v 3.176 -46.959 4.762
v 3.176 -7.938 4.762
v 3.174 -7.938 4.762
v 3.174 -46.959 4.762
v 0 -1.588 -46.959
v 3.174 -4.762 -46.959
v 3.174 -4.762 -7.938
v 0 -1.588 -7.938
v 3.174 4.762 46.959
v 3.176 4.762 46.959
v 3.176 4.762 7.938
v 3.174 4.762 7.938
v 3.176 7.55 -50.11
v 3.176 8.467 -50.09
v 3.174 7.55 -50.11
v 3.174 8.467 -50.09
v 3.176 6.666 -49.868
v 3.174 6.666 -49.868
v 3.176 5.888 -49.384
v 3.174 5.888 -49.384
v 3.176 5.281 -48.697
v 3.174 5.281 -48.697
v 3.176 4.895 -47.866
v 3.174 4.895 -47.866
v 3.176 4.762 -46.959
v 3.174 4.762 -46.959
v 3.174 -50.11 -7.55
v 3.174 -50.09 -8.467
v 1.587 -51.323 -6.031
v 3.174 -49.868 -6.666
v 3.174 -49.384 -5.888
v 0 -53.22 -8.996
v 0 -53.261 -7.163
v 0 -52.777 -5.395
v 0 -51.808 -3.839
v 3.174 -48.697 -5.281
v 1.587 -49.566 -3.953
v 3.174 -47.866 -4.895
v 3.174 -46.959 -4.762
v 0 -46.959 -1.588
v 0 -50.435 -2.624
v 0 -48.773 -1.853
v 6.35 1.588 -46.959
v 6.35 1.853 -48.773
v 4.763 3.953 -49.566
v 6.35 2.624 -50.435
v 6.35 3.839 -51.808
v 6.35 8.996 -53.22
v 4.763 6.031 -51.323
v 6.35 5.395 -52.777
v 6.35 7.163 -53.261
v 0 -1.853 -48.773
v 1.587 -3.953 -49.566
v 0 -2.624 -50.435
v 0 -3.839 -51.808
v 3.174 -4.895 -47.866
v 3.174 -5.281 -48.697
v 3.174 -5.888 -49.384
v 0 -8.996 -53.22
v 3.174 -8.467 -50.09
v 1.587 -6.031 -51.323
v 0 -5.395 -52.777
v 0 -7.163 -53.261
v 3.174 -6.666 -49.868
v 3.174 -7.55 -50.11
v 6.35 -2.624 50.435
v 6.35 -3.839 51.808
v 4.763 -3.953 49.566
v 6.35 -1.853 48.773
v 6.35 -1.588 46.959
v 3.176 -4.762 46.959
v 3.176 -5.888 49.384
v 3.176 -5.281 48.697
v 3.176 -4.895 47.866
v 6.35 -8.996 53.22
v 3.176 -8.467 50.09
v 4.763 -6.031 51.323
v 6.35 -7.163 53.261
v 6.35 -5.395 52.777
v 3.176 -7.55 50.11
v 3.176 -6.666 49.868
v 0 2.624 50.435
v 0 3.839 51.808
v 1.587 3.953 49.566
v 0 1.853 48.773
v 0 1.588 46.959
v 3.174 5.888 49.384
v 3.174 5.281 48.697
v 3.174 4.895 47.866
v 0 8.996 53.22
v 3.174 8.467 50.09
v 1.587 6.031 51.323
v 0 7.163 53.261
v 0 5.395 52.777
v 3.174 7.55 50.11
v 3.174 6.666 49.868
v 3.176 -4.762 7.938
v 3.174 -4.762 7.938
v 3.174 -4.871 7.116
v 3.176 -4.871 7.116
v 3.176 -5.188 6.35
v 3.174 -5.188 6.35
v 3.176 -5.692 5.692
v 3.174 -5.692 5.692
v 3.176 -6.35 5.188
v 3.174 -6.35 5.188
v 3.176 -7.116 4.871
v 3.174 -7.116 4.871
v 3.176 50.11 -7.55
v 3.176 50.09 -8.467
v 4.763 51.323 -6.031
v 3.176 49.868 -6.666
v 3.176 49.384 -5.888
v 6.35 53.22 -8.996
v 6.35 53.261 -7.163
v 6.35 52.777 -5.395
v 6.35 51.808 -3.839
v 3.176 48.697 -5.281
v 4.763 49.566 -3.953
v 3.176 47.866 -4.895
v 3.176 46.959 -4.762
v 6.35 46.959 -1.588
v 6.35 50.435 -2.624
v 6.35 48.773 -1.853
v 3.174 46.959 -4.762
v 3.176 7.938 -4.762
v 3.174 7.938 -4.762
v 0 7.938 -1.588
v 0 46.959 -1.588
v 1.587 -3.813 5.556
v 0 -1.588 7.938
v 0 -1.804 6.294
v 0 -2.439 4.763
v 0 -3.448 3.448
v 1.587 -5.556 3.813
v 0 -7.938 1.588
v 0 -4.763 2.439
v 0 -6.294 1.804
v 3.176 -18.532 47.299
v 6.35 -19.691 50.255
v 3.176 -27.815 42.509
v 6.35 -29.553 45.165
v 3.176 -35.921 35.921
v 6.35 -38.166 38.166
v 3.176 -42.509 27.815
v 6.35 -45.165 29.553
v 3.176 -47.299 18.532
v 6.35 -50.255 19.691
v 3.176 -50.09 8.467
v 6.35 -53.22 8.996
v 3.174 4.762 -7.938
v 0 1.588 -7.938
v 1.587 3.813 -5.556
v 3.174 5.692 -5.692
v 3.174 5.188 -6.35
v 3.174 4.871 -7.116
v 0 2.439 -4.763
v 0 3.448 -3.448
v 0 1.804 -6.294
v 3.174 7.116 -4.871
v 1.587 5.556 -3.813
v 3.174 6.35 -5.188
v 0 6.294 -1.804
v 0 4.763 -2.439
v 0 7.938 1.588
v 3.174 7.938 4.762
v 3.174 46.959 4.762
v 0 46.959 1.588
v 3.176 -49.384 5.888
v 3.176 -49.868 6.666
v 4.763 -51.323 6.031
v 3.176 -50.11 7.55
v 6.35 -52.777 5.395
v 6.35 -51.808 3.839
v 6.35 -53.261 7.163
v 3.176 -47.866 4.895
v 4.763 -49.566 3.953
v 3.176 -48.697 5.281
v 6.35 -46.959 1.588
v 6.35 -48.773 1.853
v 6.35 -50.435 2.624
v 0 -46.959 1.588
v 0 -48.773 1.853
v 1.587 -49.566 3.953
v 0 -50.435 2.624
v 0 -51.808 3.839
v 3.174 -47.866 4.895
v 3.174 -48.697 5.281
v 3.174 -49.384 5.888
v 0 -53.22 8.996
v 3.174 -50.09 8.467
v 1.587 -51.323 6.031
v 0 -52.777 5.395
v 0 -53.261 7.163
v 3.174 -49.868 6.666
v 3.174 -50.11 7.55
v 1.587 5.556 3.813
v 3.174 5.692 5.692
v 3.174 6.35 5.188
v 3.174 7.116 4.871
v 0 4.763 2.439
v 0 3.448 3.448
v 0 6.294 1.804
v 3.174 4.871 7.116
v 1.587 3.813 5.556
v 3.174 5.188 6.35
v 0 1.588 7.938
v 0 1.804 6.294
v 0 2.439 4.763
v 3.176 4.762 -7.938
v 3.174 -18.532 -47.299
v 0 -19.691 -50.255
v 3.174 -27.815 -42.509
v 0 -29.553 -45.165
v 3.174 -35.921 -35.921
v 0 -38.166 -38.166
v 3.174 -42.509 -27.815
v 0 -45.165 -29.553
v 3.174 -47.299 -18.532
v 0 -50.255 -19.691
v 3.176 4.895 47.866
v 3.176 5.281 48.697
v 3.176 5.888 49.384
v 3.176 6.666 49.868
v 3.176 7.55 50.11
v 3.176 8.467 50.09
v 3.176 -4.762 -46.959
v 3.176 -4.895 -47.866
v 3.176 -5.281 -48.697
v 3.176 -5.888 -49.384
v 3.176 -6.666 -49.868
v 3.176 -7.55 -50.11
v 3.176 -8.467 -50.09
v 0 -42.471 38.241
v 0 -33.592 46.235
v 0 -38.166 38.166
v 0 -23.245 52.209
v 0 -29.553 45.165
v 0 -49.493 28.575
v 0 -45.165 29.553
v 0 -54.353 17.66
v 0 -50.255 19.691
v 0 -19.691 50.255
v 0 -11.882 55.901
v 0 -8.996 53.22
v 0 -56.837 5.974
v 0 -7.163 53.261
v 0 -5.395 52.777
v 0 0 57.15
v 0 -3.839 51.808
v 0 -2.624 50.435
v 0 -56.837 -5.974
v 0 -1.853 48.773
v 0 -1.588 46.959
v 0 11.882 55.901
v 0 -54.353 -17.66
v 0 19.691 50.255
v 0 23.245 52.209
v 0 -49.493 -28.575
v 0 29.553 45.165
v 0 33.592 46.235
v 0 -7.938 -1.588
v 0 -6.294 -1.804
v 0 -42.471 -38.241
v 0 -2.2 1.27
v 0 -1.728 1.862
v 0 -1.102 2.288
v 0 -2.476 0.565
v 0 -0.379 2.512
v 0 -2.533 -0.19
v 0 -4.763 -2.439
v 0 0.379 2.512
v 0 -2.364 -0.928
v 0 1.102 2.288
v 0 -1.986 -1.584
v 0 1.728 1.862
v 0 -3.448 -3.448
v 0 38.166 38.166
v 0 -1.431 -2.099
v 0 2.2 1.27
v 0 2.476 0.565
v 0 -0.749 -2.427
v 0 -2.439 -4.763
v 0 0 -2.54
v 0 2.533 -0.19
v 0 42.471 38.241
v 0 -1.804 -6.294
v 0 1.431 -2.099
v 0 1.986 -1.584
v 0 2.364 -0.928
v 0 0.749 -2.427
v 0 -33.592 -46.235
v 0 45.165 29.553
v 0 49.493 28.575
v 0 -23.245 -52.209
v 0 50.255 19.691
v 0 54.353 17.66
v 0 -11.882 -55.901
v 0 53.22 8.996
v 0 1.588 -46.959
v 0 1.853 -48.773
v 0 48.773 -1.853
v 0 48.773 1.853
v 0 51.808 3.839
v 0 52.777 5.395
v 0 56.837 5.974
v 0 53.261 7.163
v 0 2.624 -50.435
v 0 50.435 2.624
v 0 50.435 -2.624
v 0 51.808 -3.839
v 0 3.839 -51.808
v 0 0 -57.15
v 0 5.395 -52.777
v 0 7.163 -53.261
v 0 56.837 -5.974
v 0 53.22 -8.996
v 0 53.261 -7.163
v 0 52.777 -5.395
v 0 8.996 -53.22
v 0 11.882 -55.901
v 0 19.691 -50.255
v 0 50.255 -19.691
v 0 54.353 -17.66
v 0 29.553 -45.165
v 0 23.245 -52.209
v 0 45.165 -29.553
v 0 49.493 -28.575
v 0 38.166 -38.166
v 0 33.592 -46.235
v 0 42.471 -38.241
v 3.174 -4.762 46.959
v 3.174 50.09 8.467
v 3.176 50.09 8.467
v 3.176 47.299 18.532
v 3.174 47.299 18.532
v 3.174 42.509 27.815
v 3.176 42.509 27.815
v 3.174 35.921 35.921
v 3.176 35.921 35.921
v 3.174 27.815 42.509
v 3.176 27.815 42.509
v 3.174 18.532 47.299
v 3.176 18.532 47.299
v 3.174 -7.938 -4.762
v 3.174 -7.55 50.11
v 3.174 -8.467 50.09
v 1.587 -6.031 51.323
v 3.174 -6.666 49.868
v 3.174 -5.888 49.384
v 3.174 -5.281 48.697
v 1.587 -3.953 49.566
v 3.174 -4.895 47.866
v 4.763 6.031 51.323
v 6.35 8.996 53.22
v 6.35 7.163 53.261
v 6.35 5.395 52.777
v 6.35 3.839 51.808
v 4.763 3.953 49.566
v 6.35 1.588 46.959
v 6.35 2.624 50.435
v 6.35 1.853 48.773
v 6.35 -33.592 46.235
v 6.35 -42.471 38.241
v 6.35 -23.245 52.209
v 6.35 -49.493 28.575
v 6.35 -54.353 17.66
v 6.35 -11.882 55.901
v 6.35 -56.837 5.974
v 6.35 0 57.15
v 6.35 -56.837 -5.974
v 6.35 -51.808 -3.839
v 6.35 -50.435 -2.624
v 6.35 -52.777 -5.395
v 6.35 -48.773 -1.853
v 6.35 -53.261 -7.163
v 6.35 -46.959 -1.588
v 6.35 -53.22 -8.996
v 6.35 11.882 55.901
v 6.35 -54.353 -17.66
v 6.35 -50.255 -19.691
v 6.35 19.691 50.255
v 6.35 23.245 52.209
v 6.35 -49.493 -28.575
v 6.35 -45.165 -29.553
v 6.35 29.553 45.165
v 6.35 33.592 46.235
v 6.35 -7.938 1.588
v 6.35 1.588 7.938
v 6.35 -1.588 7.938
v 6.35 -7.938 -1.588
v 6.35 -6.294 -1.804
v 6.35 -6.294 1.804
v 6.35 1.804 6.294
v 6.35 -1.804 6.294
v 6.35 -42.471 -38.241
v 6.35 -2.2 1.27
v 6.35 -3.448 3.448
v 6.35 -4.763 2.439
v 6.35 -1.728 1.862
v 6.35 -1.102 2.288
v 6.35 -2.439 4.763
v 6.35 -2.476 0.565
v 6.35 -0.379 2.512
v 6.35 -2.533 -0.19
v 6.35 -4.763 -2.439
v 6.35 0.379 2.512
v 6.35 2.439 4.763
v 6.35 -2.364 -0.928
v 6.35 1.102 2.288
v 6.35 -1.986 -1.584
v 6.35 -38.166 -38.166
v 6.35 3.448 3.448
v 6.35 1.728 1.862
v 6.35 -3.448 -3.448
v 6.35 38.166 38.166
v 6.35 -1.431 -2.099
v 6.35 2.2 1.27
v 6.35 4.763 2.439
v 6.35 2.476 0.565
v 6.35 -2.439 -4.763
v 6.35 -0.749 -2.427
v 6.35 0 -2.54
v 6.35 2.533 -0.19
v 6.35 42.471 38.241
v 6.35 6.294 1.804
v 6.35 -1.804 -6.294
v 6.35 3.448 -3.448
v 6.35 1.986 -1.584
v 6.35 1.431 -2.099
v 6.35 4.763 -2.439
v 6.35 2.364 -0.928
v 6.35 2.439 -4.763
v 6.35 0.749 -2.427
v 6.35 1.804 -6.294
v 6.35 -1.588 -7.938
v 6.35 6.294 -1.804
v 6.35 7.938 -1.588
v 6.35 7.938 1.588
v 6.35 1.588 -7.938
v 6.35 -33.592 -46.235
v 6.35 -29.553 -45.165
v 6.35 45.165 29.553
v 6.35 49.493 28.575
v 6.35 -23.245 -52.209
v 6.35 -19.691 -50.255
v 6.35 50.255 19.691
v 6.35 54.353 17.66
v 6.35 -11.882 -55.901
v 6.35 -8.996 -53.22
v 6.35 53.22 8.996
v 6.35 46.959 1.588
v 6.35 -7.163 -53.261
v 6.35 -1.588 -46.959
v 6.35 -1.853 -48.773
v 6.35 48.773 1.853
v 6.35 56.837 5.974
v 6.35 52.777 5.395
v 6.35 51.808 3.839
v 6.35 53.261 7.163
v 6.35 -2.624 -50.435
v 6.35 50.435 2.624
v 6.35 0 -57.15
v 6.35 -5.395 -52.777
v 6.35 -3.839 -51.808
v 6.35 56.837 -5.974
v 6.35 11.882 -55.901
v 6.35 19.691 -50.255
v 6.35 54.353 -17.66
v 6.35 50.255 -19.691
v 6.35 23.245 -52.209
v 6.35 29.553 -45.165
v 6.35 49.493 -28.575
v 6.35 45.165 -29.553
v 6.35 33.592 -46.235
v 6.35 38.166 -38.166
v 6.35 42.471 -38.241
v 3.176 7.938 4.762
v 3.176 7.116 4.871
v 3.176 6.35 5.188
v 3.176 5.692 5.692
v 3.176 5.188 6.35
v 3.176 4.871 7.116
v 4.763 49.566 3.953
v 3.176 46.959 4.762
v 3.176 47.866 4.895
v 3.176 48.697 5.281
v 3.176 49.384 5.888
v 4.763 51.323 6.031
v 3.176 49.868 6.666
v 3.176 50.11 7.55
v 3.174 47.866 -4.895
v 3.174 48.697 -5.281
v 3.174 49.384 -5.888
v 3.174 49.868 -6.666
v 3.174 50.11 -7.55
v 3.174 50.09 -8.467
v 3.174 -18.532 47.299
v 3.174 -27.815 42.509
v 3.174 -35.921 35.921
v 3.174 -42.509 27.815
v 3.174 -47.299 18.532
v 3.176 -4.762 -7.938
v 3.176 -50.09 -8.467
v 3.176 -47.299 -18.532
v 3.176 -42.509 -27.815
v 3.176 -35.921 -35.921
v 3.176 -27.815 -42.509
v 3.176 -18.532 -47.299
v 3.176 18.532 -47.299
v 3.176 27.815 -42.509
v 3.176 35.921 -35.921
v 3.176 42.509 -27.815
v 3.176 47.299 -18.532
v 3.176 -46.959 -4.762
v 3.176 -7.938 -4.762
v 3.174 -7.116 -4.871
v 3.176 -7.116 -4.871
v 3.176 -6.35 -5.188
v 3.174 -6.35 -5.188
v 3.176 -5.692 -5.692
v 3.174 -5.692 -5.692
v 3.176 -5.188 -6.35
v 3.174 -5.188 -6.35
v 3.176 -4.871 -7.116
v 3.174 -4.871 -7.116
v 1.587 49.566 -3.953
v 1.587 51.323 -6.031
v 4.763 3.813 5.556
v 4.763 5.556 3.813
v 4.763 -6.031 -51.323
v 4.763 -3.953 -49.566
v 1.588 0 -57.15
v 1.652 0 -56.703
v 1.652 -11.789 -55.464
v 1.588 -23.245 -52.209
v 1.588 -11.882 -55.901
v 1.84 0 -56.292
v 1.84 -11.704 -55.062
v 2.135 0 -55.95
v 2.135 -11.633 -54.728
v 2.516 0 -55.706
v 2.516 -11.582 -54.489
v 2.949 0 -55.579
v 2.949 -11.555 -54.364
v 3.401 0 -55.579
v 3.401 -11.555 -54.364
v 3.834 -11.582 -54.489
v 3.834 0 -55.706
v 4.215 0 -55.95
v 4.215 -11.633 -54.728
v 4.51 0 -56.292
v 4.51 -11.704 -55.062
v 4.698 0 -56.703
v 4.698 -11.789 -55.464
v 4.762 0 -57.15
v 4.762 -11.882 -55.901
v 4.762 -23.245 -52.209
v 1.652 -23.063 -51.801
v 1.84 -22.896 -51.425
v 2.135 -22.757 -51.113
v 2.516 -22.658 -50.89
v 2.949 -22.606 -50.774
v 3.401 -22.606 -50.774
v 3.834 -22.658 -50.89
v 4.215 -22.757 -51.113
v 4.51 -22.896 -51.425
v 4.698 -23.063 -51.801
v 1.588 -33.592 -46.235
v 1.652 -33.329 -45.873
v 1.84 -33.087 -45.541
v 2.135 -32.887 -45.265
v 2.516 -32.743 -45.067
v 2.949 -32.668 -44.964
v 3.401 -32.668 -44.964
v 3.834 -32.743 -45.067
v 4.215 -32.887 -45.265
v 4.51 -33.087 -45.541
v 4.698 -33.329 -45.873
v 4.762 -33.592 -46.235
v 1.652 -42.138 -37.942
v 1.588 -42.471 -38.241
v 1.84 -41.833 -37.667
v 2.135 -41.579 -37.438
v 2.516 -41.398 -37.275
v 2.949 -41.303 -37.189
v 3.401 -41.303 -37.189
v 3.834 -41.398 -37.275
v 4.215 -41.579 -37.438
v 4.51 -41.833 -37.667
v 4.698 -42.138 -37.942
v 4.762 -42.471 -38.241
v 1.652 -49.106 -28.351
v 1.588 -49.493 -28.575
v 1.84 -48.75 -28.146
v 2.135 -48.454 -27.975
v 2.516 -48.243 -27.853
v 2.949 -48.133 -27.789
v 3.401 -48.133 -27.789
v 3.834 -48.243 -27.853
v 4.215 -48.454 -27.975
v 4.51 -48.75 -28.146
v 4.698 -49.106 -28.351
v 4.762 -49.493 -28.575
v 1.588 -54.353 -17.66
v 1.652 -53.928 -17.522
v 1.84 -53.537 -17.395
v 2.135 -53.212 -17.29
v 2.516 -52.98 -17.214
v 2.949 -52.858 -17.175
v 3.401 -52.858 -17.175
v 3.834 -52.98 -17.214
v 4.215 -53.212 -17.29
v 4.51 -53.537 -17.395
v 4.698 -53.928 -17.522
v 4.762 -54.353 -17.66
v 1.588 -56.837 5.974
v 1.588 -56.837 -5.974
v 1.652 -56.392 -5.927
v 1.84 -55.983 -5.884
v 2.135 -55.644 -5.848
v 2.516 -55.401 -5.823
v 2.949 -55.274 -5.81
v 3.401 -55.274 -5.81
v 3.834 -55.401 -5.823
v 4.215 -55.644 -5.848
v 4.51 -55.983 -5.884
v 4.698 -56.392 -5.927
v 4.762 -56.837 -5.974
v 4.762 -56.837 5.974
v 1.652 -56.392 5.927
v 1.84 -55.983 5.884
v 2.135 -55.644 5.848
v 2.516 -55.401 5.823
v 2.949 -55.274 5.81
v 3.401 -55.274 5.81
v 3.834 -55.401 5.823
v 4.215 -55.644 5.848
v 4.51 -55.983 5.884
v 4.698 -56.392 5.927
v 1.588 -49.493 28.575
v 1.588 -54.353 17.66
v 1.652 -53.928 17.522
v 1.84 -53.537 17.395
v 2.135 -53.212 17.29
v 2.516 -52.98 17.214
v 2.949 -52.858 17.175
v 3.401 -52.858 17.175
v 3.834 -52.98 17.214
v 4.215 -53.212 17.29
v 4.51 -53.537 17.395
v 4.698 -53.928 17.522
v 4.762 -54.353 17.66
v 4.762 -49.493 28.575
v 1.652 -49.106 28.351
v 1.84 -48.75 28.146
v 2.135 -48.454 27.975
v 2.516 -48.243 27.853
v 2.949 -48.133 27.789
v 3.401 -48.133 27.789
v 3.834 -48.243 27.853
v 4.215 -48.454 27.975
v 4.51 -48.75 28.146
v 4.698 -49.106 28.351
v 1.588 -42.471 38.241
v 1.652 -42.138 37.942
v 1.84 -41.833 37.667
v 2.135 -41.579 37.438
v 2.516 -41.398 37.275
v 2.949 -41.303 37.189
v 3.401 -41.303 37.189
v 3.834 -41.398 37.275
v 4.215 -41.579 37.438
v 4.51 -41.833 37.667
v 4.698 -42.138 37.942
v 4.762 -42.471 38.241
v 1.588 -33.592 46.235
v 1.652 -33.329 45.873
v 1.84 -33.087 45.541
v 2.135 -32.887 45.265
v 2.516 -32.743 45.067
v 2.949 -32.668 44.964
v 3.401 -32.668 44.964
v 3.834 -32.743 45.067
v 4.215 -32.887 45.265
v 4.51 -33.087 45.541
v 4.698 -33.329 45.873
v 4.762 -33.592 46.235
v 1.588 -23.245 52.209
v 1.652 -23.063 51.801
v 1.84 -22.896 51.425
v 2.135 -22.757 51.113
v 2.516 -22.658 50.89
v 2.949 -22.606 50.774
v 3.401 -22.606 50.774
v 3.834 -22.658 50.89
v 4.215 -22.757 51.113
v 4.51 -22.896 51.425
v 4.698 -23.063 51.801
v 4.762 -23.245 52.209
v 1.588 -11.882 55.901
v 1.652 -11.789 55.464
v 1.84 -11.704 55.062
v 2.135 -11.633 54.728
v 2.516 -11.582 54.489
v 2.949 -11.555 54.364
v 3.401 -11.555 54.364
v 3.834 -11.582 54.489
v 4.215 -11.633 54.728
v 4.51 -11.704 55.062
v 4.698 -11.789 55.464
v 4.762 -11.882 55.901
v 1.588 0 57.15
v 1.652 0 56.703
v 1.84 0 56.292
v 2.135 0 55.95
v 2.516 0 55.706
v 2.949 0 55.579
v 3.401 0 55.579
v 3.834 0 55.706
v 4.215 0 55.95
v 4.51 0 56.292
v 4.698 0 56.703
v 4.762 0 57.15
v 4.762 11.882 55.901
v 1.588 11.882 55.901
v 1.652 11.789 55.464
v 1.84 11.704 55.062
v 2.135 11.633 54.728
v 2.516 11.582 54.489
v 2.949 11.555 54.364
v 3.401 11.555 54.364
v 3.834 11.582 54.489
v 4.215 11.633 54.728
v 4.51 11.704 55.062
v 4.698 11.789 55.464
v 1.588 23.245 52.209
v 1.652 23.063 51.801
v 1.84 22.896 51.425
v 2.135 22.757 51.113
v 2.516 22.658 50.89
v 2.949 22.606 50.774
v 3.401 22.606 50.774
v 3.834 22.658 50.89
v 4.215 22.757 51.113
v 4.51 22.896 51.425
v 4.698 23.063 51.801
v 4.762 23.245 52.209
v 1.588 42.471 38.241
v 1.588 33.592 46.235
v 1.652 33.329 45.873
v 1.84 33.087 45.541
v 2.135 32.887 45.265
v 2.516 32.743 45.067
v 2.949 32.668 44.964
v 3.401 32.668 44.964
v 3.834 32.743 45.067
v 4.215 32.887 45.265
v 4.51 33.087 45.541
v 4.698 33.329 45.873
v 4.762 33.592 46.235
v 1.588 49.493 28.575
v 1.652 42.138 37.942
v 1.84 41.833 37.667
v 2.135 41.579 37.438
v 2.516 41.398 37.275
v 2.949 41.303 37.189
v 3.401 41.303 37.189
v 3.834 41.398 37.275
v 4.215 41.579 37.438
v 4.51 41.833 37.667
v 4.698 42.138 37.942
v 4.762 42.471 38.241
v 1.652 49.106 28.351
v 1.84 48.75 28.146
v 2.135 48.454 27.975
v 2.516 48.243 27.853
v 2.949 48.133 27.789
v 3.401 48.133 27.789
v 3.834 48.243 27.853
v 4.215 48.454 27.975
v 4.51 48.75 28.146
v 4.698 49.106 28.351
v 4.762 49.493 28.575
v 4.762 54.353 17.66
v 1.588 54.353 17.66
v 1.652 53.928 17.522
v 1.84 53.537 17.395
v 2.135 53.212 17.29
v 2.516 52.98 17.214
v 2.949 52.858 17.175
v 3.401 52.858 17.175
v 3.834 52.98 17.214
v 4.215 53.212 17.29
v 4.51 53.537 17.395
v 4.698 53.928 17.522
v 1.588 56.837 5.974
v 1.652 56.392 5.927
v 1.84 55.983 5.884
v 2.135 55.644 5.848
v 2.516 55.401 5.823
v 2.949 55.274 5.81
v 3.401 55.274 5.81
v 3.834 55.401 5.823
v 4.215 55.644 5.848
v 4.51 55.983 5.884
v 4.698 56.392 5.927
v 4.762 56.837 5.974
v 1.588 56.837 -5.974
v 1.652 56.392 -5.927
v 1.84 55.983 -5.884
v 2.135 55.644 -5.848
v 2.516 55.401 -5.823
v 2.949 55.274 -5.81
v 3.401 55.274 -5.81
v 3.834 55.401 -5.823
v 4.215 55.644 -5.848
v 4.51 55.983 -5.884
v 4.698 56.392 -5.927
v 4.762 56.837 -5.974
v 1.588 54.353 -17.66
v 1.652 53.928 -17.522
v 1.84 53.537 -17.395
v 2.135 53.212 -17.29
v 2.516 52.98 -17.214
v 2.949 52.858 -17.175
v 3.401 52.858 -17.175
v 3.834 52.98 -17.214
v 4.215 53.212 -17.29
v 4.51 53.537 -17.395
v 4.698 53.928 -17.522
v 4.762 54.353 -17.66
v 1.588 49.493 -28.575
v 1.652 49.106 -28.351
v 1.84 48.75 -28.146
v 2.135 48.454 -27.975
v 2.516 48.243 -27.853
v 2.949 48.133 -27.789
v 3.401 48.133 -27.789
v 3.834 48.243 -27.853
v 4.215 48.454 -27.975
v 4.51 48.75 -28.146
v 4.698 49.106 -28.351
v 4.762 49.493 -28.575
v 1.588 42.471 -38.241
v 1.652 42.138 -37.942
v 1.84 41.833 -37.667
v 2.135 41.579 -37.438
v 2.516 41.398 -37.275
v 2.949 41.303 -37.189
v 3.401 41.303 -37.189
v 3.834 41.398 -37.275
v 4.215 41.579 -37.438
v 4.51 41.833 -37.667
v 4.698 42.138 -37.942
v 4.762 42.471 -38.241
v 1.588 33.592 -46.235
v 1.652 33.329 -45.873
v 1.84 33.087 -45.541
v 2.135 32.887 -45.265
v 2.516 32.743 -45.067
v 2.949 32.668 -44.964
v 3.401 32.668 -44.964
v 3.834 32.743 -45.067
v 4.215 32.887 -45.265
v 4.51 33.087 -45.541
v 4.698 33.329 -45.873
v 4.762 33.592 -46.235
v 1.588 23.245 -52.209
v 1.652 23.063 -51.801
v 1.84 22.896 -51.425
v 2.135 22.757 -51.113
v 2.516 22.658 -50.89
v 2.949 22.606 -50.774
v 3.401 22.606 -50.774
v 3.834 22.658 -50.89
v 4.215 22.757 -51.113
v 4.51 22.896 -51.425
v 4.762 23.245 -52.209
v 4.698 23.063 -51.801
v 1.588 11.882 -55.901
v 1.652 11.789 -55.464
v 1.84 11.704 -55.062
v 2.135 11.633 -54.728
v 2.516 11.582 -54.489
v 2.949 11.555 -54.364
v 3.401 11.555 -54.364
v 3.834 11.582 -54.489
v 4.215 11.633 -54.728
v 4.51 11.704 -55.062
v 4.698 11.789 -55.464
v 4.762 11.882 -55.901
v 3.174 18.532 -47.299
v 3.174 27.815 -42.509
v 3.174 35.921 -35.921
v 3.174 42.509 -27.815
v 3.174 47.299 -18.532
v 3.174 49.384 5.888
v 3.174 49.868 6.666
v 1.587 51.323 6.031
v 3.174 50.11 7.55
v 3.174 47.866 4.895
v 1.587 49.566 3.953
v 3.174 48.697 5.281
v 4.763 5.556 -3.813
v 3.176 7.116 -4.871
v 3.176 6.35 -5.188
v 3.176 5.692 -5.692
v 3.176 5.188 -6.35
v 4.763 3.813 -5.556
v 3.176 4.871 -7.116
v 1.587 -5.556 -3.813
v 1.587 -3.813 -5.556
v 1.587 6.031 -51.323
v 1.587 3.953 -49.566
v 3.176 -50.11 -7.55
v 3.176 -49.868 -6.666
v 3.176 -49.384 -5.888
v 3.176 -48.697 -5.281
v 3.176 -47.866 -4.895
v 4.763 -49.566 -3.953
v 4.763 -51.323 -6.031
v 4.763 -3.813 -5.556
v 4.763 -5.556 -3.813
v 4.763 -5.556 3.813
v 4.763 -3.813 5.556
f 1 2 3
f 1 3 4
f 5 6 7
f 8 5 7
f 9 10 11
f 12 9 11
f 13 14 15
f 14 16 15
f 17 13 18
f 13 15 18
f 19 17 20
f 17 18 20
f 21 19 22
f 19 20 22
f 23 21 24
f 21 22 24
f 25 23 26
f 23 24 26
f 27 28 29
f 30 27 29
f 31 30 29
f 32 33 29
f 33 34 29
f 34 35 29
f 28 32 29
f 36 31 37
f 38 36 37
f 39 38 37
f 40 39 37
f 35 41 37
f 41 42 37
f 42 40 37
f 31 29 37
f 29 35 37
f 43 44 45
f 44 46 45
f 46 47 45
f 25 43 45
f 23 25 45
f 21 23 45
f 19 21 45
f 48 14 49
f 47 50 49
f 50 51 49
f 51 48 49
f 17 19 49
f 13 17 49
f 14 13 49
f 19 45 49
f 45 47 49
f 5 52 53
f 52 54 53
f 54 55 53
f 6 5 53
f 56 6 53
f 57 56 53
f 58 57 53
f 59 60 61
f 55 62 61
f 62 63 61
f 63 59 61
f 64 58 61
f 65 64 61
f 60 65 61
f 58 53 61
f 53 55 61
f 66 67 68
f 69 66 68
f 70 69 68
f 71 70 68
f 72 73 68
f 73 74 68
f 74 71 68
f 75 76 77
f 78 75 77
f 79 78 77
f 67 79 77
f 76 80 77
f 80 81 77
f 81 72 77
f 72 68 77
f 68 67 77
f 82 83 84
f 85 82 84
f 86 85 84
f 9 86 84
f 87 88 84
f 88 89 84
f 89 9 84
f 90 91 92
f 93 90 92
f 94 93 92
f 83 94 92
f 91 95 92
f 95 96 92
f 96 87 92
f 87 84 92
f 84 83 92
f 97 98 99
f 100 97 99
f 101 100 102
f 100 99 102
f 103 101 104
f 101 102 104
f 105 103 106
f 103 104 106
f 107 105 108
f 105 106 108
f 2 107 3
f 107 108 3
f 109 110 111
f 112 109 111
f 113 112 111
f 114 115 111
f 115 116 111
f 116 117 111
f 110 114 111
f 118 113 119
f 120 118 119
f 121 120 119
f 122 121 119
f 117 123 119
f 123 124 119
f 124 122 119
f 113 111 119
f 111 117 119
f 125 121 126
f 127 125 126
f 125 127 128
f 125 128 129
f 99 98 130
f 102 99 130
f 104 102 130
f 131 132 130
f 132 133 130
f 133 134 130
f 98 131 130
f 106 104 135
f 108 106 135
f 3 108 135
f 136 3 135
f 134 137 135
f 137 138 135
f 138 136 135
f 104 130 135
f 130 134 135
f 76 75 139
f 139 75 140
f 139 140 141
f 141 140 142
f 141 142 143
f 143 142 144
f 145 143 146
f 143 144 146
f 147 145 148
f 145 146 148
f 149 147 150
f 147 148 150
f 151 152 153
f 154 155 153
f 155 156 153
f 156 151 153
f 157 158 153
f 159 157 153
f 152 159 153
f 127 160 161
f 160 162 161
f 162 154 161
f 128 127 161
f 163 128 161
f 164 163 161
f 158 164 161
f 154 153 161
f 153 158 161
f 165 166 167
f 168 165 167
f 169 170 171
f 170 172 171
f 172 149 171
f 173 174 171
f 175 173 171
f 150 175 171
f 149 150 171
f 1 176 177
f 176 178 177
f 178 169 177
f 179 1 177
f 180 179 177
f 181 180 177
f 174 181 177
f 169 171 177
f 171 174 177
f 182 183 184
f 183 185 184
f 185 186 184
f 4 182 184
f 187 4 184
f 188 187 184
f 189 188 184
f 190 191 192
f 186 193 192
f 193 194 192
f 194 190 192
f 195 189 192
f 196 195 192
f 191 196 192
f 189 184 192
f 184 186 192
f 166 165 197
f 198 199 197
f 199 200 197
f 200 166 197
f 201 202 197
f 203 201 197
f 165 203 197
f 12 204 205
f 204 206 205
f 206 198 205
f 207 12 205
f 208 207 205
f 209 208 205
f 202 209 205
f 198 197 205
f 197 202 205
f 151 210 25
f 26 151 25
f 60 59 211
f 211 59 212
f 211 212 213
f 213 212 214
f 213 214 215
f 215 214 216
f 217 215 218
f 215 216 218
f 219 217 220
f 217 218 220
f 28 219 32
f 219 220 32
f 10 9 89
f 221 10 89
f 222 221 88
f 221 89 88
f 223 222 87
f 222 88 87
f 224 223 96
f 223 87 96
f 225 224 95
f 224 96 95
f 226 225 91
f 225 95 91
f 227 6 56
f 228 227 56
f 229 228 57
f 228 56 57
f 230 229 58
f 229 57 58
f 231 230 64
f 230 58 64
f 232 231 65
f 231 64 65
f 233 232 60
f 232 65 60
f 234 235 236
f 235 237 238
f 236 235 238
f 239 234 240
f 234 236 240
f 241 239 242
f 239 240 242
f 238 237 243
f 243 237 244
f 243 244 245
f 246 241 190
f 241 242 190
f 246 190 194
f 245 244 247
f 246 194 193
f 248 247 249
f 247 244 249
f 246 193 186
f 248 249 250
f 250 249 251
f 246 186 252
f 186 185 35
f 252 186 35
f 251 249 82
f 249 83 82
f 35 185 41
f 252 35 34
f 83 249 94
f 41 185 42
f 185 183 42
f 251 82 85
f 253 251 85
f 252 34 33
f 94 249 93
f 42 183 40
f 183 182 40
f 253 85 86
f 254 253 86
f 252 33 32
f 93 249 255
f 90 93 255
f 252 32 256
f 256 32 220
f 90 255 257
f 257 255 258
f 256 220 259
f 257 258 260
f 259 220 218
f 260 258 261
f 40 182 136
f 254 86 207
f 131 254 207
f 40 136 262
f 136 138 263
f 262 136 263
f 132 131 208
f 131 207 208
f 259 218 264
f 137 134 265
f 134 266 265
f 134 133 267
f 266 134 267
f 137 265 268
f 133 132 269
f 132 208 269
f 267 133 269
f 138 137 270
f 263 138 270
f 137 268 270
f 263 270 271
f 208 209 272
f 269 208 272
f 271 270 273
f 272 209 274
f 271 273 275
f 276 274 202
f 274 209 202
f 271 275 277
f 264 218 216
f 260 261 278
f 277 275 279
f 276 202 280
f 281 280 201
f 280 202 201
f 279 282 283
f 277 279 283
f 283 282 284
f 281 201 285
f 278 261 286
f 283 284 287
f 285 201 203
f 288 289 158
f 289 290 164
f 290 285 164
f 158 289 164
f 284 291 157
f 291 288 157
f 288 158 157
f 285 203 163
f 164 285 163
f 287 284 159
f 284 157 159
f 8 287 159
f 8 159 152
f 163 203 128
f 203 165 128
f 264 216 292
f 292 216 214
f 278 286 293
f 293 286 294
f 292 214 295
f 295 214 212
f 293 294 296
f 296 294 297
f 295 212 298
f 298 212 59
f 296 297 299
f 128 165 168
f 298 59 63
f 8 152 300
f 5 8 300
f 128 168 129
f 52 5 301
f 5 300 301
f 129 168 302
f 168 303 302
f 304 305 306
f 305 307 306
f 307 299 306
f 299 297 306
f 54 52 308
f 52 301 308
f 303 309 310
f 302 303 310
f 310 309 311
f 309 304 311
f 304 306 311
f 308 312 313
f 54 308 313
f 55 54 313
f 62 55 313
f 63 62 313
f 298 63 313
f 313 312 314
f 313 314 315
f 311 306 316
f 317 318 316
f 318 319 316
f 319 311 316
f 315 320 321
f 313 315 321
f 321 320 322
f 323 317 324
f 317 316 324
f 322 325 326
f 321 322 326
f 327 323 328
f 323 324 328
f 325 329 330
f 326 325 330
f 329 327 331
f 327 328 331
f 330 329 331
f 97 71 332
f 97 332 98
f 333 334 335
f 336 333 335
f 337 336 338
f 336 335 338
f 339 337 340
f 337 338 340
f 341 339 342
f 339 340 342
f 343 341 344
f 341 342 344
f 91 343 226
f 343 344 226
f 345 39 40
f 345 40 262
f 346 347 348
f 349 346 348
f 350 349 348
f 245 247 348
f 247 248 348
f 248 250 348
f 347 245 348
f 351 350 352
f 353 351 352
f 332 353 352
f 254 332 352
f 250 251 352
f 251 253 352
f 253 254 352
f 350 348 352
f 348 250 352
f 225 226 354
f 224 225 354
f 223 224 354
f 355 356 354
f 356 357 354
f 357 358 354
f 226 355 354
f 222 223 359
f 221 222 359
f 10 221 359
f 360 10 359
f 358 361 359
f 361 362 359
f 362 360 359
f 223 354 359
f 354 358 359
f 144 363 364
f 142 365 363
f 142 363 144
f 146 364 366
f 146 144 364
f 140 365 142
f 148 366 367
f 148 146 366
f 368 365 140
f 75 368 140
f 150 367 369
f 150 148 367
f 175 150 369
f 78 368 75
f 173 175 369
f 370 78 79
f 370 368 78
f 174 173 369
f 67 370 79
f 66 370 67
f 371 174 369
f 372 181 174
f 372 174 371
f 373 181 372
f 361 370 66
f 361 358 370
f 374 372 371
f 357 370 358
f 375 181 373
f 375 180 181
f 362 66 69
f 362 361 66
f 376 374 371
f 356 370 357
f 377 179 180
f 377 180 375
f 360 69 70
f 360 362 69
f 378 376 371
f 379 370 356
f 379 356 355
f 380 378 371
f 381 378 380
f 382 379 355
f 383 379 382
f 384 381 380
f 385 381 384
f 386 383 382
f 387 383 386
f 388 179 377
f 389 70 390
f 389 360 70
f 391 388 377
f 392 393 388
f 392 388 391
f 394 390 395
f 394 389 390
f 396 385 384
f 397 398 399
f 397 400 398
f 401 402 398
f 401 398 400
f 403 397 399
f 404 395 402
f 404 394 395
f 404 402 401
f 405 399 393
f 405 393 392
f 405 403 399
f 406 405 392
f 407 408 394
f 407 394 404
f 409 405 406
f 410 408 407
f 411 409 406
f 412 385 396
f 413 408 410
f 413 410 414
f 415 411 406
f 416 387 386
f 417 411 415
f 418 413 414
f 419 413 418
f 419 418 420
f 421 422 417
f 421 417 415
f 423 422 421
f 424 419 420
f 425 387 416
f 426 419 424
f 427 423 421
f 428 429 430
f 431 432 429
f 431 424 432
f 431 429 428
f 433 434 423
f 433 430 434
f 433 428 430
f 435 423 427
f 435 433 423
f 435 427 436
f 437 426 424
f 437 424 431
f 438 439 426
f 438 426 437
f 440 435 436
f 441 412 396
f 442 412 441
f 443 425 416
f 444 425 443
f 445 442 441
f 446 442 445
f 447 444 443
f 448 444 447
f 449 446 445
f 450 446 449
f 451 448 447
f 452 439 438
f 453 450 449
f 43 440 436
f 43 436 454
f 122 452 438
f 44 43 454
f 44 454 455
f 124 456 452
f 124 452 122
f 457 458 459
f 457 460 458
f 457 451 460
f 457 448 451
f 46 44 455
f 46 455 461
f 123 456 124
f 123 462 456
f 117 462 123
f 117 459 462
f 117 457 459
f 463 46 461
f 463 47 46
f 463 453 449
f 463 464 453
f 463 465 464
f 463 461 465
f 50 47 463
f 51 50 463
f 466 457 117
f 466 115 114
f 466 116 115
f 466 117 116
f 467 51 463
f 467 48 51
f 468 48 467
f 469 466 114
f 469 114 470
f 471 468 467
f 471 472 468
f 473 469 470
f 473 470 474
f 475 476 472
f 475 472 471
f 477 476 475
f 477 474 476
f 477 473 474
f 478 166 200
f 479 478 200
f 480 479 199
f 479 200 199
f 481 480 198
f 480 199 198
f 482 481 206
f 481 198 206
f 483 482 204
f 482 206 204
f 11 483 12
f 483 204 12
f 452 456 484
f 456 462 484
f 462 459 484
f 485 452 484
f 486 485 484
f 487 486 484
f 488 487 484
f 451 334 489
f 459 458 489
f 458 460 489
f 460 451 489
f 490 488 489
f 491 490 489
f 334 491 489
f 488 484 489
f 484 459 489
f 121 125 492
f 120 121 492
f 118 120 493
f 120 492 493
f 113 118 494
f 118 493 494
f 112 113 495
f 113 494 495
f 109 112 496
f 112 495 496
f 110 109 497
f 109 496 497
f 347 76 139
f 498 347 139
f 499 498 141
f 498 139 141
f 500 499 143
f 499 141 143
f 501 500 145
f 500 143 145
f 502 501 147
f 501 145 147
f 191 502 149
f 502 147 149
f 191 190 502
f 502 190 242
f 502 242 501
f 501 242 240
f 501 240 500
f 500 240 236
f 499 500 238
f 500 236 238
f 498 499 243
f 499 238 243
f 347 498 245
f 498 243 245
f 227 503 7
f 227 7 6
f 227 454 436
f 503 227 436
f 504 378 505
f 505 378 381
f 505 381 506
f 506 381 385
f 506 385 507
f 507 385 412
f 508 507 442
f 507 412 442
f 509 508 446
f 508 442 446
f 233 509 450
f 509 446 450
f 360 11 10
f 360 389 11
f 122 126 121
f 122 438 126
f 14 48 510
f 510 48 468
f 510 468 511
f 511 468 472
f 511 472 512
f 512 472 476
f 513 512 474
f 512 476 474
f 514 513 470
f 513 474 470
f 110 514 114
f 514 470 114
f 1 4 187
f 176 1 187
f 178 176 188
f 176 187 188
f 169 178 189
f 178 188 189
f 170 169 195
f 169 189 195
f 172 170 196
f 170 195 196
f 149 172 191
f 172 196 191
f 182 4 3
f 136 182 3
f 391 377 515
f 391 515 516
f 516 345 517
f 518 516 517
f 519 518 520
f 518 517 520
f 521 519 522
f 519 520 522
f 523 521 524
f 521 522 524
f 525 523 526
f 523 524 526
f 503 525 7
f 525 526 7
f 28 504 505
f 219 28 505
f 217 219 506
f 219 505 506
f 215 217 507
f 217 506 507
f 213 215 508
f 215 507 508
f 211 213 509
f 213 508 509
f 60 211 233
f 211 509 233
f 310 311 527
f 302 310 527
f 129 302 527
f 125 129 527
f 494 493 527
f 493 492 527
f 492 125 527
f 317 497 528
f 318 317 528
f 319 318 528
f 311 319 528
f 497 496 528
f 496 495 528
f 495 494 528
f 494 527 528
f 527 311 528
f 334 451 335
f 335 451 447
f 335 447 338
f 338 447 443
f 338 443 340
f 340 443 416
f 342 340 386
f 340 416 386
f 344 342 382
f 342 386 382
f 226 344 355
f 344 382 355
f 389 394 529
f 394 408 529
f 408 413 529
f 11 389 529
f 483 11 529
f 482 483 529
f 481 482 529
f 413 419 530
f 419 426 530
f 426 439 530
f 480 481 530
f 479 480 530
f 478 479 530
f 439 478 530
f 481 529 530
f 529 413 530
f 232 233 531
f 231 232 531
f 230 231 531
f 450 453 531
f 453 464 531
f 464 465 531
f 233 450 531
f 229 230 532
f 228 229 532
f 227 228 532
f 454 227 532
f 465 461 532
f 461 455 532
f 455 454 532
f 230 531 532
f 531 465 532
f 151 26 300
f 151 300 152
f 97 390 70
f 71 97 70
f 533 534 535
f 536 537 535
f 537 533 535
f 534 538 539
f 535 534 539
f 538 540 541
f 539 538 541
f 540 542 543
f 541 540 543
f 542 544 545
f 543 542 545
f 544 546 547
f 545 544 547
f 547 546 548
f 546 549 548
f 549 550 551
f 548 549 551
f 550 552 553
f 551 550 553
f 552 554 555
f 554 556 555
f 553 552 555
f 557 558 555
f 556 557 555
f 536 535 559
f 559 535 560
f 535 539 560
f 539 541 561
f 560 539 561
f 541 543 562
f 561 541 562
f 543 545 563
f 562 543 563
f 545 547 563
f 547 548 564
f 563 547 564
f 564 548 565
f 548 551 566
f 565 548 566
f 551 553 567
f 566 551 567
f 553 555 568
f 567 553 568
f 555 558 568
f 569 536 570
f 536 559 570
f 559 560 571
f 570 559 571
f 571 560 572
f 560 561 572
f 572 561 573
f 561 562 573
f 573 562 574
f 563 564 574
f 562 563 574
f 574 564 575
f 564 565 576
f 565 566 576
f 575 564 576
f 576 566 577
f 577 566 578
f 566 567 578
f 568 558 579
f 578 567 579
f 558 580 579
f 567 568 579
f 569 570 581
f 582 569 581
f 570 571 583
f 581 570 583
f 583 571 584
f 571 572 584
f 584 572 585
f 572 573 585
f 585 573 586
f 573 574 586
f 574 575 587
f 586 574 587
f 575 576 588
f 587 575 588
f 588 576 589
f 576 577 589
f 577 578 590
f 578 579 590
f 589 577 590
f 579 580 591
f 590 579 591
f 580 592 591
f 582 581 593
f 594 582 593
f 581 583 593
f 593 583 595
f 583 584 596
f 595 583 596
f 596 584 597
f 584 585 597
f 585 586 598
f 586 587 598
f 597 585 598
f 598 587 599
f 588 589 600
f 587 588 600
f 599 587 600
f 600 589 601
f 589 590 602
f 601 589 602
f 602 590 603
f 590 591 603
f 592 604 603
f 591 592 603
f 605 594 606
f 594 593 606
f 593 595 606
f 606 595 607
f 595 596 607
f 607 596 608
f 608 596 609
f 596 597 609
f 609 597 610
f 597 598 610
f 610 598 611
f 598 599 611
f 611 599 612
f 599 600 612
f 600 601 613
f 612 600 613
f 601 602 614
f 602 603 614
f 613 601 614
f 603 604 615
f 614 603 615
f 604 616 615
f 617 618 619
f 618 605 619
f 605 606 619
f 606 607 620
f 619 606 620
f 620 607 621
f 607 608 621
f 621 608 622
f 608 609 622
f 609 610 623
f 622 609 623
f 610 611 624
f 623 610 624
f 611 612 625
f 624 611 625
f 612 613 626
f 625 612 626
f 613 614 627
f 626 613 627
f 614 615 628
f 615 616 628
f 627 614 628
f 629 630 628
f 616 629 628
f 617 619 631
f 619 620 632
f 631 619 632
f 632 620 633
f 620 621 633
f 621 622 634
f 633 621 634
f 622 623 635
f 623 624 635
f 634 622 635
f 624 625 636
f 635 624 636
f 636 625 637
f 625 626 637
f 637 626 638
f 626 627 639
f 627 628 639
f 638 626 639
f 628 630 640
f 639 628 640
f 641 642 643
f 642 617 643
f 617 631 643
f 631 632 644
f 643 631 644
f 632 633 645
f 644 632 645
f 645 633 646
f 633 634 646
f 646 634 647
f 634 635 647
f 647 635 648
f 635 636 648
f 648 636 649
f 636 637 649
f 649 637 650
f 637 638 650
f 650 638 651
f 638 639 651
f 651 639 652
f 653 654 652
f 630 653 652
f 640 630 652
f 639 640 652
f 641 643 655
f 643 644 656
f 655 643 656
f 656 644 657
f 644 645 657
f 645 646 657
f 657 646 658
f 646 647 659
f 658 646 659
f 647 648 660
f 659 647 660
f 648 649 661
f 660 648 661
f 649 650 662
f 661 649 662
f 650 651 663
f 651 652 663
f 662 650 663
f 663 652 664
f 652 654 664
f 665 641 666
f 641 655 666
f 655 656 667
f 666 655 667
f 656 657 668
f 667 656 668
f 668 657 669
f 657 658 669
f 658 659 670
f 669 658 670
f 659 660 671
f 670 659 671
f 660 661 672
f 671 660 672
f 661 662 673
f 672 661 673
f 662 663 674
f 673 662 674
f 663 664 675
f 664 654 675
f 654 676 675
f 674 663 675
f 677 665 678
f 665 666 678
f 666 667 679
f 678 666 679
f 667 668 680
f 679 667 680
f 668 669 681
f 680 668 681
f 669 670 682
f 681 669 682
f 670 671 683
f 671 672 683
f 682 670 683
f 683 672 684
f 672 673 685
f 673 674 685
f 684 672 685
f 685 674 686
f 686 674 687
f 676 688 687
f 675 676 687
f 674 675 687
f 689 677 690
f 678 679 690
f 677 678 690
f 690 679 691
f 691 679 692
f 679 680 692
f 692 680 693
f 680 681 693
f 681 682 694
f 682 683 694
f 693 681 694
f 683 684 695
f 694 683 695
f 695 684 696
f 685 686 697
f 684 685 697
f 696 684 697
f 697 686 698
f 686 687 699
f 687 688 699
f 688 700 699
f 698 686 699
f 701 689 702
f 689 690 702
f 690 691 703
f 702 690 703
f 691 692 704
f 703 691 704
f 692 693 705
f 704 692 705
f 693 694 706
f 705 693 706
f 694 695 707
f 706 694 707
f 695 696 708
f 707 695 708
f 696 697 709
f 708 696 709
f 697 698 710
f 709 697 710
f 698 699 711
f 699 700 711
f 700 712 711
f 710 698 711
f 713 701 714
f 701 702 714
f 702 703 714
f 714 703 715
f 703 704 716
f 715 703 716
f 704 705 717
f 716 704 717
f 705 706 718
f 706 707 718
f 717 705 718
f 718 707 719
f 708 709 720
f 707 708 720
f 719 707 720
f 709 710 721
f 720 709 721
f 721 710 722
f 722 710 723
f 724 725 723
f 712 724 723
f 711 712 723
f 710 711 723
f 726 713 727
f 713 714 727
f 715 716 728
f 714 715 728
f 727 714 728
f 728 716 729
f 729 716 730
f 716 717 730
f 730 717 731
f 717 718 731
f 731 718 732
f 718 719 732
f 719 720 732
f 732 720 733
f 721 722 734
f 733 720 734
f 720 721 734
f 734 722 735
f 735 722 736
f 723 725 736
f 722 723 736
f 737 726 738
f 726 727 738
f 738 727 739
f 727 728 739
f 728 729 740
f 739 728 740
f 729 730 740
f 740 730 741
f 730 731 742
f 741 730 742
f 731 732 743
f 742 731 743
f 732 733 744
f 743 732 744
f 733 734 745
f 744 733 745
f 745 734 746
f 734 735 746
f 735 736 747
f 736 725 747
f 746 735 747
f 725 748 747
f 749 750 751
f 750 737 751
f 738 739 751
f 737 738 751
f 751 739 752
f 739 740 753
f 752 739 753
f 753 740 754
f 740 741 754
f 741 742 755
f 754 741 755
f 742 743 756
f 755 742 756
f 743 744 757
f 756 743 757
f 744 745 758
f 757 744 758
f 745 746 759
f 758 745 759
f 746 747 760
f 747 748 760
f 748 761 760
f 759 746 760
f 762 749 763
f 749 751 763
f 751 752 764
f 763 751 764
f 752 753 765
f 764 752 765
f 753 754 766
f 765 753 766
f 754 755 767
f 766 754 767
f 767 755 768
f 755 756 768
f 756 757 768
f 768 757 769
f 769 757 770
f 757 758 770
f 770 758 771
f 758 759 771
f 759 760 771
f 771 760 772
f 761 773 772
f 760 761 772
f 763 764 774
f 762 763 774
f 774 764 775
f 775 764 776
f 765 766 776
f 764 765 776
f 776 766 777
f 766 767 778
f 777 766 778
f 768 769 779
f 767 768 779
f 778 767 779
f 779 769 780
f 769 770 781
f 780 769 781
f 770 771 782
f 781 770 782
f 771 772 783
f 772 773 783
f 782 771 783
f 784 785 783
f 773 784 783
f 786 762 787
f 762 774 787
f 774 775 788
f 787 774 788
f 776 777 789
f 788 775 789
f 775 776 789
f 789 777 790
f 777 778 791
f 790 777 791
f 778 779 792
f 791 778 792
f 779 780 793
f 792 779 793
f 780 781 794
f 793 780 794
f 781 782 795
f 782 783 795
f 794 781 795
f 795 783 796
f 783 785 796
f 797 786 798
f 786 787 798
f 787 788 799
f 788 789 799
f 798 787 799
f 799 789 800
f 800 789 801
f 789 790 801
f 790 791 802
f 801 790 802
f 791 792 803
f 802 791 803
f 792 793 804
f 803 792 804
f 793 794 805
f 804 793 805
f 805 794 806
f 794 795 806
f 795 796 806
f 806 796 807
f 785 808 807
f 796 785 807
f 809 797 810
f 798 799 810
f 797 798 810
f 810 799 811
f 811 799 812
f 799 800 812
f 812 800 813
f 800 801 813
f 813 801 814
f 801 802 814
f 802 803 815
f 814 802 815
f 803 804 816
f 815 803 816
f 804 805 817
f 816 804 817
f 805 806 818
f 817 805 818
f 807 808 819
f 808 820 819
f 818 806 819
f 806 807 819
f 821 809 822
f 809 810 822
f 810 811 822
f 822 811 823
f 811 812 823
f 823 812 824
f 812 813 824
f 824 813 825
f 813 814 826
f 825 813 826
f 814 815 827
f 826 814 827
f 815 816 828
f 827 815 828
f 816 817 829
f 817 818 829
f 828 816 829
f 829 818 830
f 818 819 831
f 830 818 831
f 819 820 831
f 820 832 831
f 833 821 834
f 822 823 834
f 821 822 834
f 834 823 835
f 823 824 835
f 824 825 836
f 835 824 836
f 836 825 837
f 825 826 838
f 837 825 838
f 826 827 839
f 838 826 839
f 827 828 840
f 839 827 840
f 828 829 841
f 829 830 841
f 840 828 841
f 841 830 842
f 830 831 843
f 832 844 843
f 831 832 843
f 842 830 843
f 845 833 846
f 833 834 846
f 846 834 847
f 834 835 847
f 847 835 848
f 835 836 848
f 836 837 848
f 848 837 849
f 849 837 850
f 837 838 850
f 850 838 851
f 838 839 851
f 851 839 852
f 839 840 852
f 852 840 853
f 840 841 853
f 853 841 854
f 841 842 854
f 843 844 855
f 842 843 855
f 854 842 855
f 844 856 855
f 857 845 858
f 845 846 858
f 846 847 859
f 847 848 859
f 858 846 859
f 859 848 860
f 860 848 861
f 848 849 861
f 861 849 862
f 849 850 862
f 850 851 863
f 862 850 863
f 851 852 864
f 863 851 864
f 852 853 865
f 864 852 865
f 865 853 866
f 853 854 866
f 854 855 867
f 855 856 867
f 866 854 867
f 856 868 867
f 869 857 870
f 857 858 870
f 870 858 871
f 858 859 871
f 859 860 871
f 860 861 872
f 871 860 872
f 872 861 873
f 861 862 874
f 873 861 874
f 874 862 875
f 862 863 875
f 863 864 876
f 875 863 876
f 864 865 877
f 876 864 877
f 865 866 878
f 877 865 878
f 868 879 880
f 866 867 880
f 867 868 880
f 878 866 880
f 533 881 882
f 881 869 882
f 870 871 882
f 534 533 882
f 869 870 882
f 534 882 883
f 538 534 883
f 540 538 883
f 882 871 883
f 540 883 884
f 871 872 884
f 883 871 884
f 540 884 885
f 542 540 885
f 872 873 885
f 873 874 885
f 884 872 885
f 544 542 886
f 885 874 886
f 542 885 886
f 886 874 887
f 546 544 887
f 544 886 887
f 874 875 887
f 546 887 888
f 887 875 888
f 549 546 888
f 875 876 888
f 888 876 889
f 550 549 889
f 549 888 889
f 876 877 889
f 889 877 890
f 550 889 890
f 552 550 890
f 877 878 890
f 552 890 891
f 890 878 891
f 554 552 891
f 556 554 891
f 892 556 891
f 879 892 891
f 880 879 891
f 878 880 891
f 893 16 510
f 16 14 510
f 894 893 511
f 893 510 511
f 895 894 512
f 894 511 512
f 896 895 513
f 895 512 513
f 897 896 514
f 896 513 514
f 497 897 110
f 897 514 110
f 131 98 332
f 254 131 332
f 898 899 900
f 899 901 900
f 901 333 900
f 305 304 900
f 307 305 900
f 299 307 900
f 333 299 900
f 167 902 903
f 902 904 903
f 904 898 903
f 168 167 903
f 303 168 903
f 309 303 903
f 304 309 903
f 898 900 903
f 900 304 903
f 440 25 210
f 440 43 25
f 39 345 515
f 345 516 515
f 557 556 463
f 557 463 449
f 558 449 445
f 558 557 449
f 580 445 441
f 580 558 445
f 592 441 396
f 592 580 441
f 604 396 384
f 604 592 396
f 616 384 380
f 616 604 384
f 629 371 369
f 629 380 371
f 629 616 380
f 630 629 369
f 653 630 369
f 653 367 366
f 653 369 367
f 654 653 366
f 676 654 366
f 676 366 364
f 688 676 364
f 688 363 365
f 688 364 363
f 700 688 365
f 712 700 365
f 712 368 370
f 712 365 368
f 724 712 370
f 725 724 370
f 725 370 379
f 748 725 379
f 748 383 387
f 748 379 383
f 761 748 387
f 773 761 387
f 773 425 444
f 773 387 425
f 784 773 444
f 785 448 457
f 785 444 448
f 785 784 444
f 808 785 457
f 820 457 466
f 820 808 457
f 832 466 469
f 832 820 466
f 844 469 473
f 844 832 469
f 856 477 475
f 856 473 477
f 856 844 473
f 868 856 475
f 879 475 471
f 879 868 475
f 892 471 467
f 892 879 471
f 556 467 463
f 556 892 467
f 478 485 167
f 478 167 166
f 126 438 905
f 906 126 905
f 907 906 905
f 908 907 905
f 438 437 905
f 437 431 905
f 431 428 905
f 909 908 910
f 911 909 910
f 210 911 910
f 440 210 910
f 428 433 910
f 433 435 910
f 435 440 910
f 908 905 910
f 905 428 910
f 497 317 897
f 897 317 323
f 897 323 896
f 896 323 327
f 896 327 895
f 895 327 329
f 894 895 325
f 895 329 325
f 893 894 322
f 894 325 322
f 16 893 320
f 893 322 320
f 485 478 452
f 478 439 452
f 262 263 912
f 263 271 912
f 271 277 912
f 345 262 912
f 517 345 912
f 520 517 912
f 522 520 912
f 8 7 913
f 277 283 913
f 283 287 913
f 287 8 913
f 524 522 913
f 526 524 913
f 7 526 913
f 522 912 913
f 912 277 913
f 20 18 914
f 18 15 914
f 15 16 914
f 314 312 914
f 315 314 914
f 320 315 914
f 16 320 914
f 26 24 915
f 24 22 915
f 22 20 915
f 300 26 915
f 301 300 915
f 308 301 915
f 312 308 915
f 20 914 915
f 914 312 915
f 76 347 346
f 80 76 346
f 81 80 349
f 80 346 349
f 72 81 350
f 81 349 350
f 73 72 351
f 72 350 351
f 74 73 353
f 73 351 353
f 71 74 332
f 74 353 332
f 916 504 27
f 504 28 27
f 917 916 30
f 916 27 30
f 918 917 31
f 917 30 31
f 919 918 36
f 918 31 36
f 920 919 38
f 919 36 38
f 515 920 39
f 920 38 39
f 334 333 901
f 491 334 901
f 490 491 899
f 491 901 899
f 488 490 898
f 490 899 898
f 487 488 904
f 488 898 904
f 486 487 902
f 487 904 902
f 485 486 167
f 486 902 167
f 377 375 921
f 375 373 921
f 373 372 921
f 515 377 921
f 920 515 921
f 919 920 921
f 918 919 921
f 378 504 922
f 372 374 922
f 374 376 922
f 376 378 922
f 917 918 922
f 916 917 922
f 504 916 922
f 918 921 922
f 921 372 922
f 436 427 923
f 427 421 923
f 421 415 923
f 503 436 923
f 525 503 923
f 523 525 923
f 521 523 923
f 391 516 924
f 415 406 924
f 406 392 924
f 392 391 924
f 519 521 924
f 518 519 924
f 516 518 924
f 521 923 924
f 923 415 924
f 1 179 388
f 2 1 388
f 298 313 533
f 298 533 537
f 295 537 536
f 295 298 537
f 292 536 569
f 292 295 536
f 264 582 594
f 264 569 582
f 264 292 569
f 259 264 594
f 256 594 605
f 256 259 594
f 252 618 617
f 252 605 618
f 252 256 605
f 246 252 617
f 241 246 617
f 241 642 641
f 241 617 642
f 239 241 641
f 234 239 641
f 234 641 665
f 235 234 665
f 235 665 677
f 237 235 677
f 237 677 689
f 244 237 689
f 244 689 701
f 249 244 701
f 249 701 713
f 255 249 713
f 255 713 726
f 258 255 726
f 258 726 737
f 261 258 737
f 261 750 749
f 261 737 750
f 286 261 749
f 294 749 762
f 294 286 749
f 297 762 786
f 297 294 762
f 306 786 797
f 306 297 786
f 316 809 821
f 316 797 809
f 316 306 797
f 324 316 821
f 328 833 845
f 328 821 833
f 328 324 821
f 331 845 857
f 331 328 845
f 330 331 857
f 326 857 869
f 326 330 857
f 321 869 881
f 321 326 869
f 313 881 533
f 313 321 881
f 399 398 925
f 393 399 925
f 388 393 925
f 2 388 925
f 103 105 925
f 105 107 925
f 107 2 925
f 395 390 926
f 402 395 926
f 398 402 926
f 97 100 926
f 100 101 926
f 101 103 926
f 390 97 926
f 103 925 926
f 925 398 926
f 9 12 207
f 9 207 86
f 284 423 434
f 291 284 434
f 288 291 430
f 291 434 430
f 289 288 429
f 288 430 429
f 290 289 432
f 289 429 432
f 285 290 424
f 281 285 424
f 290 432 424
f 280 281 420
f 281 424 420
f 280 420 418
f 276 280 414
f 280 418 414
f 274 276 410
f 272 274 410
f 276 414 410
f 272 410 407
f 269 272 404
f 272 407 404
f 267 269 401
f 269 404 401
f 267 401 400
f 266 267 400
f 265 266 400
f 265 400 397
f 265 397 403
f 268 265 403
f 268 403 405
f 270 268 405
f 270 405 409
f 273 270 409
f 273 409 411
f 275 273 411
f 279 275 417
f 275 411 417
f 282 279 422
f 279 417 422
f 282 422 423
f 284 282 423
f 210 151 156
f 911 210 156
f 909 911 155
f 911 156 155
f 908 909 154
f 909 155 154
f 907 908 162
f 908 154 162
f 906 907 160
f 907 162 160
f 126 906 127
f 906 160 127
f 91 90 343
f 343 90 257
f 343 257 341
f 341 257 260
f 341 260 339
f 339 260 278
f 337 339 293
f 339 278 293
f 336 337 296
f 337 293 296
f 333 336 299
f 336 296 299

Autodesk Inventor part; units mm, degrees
ref_plane "YZ Plane" through (0, 0, 0) normal (1, 0, 0) x (0, 1, 0)
ref_plane "XZ Plane" through (0, 0, 0) normal (0, 1, 0) x (-1, 0, 0)
ref_plane "XY Plane" through (0, 0, 0) normal (0, 0, 1) x (1, 0, 0)
sketch "Sketch1" plane through (0, 0, 0) normal (0, 1, 0) x (-1, 0, 0)
  line L0 (0, 0) -> (-6.35, 0)
  line L1 (-6.35, 0) -> (-6.35, -57.15)
  line L2 (0, -57.15) -> (0, 0)
  arc A0 (-1.5875, -57.15) -> (-4.7625, -57.15) centre (-3.175, -57.15) ccw
  line L3 (-6.35, -57.15) -> (-4.7625, -57.15)
  line L4 (-1.5875, -57.15) -> (0, -57.15)
  dimension "d0" = 6.35
  dimension "d1" = 57.15
  dimension "d2" = 3.175
revolve "Revolution1" add sketch "Sketch1" angle 360 about axis through (0, 0, 0) along (1, 0, 0)
sketch "Sketch2" plane through (6.35, 0, 0) normal (1, 0, 0) x (0, 0, -1)
  line L0 (-4.7625, 50.5763) -> (-4.7625, 4.7625)
  line L1 (-4.7625, -4.7625) -> (-4.7625, -50.5763)
  line L2 (4.7625, 50.5763) -> (4.7625, 4.7625)
  line L3 (4.7625, -4.7625) -> (4.7625, -50.5763)
  arc A0 (50.5763, 4.7625) -> (4.7625, 50.5763) centre (0, 0) ccw
  arc A1 (-4.7625, 50.5763) -> (-50.5763, 4.7625) centre (0, 0) ccw
  line L4 (-50.5763, 4.7625) -> (-4.7625, 4.7625)
  line L5 (4.7625, 4.7625) -> (50.5763, 4.7625)
  line L6 (-50.5763, -4.7625) -> (-4.7625, -4.7625)
  line L7 (4.7625, -4.7625) -> (50.5763, -4.7625)
  arc A2 (-50.5763, -4.7625) -> (-4.7625, -50.5763) centre (0, 0) ccw
  arc A3 (4.7625, -50.5763) -> (50.5763, -4.7625) centre (0, 0) ccw
extrude "Extrusion1" cut sketch "Sketch2" against normal blind 25.4
fillet "Fillet1" radius 3.175 12 edges at (3.175, 4.7625, 4.7625) (3.175, 4.7625, -4.7625) (3.175, -4.7625, -4.7625) (3.175, -4.7625, 4.7625) (3.175, -4.7625, -50.5763) (3.175, -50.5763, -4.7625) (3.175, -50.5763, 4.7625) (3.175, -4.7625, 50.5763) (3.175, 4.7625, 50.5763) (3.175, 50.5763, 4.7625) (3.175, 50.5763, -4.7625) (3.175, 4.7625, -50.5763)
sketch "Sketch3" plane through (6.35, 0, 0) normal (1, 0, 0) x (0, 0, -1)
  circle A0 centre (0, 0) radius 2.54
  dimension "d12" = 5.08
extrude "Extrusion2" cut sketch "Sketch3" against normal blind 25.4
chamfer "Chamfer1" distance 3.175 angle 45 48 edges at (6.35, -27.4482, -4.7625) (6.35, -5.6924, -5.6924) (6.35, -4.7625, -27.4482) (6.35, -5.888, -49.3838) (6.35, -35.921, -35.921) (6.35, -49.3838, -5.888) (6.35, -27.4482, 4.7625) (6.35, -49.3838, 5.888) (6.35, -35.921, 35.921) (6.35, -5.888, 49.3838) (6.35, -4.7625, 27.4482) (6.35, -5.6924, 5.6924) (6.35, 5.6924, 5.6924) (6.35, 27.4482, 4.7625) (6.35, 49.3838, 5.888) (6.35, 35.921, 35.921) (6.35, 5.888, 49.3838) (6.35, 4.7625, 27.4482) (6.35, 5.6924, -5.6924) (6.35, 4.7625, -27.4482) (6.35, 5.888, -49.3838) (6.35, 35.921, -35.921) (6.35, 49.3838, -5.888) (6.35, 27.4482, -4.7625) (0, 5.6924, 5.6924) (0, 4.7625, 27.4482) (0, 5.888, 49.3838) (0, 35.921, 35.921) (0, 49.3838, 5.888) (0, 27.4482, 4.7625) (0, -5.6924, 5.6924) (0, -27.4482, 4.7625) (0, -49.3838, 5.888) (0, -35.921, 35.921) (0, -5.888, 49.3838) (0, -4.7625, 27.4482) (0, -5.6924, -5.6924) (0, -4.7625, -27.4482) (0, -5.888, -49.3838) (0, -35.921, -35.921) (0, -49.3838, -5.888) (0, -27.4482, -4.7625) (0, 5.6924, -5.6924) (0, 27.4482, -4.7625) (0, 49.3838, -5.888) (0, 35.921, -35.921) (0, 5.888, -49.3838) (0, 4.7625, -27.4482)
properties part number "Wheel"
